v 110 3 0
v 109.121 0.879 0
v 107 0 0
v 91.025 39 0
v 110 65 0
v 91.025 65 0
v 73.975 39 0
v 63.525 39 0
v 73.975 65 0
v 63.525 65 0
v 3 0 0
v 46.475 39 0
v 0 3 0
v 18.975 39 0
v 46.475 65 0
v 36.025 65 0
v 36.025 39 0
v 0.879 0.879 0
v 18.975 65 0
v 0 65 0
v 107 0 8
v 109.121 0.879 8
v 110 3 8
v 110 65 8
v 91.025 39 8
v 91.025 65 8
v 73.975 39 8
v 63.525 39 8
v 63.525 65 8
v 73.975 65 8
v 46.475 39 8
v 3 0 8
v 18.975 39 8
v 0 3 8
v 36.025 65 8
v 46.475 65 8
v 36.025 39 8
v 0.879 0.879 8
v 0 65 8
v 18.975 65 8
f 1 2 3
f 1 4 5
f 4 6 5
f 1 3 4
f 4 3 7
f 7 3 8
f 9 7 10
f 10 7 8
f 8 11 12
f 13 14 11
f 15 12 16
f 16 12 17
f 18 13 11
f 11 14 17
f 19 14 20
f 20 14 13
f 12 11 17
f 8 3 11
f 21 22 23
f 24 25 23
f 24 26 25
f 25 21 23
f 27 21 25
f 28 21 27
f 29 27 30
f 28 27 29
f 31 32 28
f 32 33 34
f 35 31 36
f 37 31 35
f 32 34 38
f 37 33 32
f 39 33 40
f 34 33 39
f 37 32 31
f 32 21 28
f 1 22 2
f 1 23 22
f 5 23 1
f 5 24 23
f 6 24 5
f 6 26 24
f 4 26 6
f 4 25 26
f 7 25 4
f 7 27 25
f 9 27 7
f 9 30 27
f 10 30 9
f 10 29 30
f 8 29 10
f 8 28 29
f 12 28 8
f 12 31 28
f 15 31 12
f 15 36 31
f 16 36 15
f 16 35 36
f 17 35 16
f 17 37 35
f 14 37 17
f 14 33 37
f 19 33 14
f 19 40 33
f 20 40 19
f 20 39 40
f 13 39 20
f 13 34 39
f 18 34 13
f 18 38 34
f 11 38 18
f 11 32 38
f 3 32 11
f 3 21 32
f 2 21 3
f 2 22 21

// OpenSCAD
$fn = 32;

// ----------------------------------------------------------------------
// Window plate: 110 x 65 mm, 3 open windows
// ----------------------------------------------------------------------

// --- parameters (mm) ---
profile_height = 8;       // extrusion height
profile_points = 20;      // points of the closed outline

profile = [[0, 3], [0.879, 0.879], [3, 0], [107, 0], [109.121, 0.879], [110, 3], [110, 65], [91.025, 65], [91.025, 39], [73.975, 39], [73.975, 65], [63.525, 65], [63.525, 39], [46.475, 39], [46.475, 65], [36.025, 65], [36.025, 39], [18.975, 39], [18.975, 65], [0, 65]];  // single closed polygon, 20 points, counter clockwise

// --- the one profile operation ---
linear_extrude(height = profile_height) polygon(points = profile);
